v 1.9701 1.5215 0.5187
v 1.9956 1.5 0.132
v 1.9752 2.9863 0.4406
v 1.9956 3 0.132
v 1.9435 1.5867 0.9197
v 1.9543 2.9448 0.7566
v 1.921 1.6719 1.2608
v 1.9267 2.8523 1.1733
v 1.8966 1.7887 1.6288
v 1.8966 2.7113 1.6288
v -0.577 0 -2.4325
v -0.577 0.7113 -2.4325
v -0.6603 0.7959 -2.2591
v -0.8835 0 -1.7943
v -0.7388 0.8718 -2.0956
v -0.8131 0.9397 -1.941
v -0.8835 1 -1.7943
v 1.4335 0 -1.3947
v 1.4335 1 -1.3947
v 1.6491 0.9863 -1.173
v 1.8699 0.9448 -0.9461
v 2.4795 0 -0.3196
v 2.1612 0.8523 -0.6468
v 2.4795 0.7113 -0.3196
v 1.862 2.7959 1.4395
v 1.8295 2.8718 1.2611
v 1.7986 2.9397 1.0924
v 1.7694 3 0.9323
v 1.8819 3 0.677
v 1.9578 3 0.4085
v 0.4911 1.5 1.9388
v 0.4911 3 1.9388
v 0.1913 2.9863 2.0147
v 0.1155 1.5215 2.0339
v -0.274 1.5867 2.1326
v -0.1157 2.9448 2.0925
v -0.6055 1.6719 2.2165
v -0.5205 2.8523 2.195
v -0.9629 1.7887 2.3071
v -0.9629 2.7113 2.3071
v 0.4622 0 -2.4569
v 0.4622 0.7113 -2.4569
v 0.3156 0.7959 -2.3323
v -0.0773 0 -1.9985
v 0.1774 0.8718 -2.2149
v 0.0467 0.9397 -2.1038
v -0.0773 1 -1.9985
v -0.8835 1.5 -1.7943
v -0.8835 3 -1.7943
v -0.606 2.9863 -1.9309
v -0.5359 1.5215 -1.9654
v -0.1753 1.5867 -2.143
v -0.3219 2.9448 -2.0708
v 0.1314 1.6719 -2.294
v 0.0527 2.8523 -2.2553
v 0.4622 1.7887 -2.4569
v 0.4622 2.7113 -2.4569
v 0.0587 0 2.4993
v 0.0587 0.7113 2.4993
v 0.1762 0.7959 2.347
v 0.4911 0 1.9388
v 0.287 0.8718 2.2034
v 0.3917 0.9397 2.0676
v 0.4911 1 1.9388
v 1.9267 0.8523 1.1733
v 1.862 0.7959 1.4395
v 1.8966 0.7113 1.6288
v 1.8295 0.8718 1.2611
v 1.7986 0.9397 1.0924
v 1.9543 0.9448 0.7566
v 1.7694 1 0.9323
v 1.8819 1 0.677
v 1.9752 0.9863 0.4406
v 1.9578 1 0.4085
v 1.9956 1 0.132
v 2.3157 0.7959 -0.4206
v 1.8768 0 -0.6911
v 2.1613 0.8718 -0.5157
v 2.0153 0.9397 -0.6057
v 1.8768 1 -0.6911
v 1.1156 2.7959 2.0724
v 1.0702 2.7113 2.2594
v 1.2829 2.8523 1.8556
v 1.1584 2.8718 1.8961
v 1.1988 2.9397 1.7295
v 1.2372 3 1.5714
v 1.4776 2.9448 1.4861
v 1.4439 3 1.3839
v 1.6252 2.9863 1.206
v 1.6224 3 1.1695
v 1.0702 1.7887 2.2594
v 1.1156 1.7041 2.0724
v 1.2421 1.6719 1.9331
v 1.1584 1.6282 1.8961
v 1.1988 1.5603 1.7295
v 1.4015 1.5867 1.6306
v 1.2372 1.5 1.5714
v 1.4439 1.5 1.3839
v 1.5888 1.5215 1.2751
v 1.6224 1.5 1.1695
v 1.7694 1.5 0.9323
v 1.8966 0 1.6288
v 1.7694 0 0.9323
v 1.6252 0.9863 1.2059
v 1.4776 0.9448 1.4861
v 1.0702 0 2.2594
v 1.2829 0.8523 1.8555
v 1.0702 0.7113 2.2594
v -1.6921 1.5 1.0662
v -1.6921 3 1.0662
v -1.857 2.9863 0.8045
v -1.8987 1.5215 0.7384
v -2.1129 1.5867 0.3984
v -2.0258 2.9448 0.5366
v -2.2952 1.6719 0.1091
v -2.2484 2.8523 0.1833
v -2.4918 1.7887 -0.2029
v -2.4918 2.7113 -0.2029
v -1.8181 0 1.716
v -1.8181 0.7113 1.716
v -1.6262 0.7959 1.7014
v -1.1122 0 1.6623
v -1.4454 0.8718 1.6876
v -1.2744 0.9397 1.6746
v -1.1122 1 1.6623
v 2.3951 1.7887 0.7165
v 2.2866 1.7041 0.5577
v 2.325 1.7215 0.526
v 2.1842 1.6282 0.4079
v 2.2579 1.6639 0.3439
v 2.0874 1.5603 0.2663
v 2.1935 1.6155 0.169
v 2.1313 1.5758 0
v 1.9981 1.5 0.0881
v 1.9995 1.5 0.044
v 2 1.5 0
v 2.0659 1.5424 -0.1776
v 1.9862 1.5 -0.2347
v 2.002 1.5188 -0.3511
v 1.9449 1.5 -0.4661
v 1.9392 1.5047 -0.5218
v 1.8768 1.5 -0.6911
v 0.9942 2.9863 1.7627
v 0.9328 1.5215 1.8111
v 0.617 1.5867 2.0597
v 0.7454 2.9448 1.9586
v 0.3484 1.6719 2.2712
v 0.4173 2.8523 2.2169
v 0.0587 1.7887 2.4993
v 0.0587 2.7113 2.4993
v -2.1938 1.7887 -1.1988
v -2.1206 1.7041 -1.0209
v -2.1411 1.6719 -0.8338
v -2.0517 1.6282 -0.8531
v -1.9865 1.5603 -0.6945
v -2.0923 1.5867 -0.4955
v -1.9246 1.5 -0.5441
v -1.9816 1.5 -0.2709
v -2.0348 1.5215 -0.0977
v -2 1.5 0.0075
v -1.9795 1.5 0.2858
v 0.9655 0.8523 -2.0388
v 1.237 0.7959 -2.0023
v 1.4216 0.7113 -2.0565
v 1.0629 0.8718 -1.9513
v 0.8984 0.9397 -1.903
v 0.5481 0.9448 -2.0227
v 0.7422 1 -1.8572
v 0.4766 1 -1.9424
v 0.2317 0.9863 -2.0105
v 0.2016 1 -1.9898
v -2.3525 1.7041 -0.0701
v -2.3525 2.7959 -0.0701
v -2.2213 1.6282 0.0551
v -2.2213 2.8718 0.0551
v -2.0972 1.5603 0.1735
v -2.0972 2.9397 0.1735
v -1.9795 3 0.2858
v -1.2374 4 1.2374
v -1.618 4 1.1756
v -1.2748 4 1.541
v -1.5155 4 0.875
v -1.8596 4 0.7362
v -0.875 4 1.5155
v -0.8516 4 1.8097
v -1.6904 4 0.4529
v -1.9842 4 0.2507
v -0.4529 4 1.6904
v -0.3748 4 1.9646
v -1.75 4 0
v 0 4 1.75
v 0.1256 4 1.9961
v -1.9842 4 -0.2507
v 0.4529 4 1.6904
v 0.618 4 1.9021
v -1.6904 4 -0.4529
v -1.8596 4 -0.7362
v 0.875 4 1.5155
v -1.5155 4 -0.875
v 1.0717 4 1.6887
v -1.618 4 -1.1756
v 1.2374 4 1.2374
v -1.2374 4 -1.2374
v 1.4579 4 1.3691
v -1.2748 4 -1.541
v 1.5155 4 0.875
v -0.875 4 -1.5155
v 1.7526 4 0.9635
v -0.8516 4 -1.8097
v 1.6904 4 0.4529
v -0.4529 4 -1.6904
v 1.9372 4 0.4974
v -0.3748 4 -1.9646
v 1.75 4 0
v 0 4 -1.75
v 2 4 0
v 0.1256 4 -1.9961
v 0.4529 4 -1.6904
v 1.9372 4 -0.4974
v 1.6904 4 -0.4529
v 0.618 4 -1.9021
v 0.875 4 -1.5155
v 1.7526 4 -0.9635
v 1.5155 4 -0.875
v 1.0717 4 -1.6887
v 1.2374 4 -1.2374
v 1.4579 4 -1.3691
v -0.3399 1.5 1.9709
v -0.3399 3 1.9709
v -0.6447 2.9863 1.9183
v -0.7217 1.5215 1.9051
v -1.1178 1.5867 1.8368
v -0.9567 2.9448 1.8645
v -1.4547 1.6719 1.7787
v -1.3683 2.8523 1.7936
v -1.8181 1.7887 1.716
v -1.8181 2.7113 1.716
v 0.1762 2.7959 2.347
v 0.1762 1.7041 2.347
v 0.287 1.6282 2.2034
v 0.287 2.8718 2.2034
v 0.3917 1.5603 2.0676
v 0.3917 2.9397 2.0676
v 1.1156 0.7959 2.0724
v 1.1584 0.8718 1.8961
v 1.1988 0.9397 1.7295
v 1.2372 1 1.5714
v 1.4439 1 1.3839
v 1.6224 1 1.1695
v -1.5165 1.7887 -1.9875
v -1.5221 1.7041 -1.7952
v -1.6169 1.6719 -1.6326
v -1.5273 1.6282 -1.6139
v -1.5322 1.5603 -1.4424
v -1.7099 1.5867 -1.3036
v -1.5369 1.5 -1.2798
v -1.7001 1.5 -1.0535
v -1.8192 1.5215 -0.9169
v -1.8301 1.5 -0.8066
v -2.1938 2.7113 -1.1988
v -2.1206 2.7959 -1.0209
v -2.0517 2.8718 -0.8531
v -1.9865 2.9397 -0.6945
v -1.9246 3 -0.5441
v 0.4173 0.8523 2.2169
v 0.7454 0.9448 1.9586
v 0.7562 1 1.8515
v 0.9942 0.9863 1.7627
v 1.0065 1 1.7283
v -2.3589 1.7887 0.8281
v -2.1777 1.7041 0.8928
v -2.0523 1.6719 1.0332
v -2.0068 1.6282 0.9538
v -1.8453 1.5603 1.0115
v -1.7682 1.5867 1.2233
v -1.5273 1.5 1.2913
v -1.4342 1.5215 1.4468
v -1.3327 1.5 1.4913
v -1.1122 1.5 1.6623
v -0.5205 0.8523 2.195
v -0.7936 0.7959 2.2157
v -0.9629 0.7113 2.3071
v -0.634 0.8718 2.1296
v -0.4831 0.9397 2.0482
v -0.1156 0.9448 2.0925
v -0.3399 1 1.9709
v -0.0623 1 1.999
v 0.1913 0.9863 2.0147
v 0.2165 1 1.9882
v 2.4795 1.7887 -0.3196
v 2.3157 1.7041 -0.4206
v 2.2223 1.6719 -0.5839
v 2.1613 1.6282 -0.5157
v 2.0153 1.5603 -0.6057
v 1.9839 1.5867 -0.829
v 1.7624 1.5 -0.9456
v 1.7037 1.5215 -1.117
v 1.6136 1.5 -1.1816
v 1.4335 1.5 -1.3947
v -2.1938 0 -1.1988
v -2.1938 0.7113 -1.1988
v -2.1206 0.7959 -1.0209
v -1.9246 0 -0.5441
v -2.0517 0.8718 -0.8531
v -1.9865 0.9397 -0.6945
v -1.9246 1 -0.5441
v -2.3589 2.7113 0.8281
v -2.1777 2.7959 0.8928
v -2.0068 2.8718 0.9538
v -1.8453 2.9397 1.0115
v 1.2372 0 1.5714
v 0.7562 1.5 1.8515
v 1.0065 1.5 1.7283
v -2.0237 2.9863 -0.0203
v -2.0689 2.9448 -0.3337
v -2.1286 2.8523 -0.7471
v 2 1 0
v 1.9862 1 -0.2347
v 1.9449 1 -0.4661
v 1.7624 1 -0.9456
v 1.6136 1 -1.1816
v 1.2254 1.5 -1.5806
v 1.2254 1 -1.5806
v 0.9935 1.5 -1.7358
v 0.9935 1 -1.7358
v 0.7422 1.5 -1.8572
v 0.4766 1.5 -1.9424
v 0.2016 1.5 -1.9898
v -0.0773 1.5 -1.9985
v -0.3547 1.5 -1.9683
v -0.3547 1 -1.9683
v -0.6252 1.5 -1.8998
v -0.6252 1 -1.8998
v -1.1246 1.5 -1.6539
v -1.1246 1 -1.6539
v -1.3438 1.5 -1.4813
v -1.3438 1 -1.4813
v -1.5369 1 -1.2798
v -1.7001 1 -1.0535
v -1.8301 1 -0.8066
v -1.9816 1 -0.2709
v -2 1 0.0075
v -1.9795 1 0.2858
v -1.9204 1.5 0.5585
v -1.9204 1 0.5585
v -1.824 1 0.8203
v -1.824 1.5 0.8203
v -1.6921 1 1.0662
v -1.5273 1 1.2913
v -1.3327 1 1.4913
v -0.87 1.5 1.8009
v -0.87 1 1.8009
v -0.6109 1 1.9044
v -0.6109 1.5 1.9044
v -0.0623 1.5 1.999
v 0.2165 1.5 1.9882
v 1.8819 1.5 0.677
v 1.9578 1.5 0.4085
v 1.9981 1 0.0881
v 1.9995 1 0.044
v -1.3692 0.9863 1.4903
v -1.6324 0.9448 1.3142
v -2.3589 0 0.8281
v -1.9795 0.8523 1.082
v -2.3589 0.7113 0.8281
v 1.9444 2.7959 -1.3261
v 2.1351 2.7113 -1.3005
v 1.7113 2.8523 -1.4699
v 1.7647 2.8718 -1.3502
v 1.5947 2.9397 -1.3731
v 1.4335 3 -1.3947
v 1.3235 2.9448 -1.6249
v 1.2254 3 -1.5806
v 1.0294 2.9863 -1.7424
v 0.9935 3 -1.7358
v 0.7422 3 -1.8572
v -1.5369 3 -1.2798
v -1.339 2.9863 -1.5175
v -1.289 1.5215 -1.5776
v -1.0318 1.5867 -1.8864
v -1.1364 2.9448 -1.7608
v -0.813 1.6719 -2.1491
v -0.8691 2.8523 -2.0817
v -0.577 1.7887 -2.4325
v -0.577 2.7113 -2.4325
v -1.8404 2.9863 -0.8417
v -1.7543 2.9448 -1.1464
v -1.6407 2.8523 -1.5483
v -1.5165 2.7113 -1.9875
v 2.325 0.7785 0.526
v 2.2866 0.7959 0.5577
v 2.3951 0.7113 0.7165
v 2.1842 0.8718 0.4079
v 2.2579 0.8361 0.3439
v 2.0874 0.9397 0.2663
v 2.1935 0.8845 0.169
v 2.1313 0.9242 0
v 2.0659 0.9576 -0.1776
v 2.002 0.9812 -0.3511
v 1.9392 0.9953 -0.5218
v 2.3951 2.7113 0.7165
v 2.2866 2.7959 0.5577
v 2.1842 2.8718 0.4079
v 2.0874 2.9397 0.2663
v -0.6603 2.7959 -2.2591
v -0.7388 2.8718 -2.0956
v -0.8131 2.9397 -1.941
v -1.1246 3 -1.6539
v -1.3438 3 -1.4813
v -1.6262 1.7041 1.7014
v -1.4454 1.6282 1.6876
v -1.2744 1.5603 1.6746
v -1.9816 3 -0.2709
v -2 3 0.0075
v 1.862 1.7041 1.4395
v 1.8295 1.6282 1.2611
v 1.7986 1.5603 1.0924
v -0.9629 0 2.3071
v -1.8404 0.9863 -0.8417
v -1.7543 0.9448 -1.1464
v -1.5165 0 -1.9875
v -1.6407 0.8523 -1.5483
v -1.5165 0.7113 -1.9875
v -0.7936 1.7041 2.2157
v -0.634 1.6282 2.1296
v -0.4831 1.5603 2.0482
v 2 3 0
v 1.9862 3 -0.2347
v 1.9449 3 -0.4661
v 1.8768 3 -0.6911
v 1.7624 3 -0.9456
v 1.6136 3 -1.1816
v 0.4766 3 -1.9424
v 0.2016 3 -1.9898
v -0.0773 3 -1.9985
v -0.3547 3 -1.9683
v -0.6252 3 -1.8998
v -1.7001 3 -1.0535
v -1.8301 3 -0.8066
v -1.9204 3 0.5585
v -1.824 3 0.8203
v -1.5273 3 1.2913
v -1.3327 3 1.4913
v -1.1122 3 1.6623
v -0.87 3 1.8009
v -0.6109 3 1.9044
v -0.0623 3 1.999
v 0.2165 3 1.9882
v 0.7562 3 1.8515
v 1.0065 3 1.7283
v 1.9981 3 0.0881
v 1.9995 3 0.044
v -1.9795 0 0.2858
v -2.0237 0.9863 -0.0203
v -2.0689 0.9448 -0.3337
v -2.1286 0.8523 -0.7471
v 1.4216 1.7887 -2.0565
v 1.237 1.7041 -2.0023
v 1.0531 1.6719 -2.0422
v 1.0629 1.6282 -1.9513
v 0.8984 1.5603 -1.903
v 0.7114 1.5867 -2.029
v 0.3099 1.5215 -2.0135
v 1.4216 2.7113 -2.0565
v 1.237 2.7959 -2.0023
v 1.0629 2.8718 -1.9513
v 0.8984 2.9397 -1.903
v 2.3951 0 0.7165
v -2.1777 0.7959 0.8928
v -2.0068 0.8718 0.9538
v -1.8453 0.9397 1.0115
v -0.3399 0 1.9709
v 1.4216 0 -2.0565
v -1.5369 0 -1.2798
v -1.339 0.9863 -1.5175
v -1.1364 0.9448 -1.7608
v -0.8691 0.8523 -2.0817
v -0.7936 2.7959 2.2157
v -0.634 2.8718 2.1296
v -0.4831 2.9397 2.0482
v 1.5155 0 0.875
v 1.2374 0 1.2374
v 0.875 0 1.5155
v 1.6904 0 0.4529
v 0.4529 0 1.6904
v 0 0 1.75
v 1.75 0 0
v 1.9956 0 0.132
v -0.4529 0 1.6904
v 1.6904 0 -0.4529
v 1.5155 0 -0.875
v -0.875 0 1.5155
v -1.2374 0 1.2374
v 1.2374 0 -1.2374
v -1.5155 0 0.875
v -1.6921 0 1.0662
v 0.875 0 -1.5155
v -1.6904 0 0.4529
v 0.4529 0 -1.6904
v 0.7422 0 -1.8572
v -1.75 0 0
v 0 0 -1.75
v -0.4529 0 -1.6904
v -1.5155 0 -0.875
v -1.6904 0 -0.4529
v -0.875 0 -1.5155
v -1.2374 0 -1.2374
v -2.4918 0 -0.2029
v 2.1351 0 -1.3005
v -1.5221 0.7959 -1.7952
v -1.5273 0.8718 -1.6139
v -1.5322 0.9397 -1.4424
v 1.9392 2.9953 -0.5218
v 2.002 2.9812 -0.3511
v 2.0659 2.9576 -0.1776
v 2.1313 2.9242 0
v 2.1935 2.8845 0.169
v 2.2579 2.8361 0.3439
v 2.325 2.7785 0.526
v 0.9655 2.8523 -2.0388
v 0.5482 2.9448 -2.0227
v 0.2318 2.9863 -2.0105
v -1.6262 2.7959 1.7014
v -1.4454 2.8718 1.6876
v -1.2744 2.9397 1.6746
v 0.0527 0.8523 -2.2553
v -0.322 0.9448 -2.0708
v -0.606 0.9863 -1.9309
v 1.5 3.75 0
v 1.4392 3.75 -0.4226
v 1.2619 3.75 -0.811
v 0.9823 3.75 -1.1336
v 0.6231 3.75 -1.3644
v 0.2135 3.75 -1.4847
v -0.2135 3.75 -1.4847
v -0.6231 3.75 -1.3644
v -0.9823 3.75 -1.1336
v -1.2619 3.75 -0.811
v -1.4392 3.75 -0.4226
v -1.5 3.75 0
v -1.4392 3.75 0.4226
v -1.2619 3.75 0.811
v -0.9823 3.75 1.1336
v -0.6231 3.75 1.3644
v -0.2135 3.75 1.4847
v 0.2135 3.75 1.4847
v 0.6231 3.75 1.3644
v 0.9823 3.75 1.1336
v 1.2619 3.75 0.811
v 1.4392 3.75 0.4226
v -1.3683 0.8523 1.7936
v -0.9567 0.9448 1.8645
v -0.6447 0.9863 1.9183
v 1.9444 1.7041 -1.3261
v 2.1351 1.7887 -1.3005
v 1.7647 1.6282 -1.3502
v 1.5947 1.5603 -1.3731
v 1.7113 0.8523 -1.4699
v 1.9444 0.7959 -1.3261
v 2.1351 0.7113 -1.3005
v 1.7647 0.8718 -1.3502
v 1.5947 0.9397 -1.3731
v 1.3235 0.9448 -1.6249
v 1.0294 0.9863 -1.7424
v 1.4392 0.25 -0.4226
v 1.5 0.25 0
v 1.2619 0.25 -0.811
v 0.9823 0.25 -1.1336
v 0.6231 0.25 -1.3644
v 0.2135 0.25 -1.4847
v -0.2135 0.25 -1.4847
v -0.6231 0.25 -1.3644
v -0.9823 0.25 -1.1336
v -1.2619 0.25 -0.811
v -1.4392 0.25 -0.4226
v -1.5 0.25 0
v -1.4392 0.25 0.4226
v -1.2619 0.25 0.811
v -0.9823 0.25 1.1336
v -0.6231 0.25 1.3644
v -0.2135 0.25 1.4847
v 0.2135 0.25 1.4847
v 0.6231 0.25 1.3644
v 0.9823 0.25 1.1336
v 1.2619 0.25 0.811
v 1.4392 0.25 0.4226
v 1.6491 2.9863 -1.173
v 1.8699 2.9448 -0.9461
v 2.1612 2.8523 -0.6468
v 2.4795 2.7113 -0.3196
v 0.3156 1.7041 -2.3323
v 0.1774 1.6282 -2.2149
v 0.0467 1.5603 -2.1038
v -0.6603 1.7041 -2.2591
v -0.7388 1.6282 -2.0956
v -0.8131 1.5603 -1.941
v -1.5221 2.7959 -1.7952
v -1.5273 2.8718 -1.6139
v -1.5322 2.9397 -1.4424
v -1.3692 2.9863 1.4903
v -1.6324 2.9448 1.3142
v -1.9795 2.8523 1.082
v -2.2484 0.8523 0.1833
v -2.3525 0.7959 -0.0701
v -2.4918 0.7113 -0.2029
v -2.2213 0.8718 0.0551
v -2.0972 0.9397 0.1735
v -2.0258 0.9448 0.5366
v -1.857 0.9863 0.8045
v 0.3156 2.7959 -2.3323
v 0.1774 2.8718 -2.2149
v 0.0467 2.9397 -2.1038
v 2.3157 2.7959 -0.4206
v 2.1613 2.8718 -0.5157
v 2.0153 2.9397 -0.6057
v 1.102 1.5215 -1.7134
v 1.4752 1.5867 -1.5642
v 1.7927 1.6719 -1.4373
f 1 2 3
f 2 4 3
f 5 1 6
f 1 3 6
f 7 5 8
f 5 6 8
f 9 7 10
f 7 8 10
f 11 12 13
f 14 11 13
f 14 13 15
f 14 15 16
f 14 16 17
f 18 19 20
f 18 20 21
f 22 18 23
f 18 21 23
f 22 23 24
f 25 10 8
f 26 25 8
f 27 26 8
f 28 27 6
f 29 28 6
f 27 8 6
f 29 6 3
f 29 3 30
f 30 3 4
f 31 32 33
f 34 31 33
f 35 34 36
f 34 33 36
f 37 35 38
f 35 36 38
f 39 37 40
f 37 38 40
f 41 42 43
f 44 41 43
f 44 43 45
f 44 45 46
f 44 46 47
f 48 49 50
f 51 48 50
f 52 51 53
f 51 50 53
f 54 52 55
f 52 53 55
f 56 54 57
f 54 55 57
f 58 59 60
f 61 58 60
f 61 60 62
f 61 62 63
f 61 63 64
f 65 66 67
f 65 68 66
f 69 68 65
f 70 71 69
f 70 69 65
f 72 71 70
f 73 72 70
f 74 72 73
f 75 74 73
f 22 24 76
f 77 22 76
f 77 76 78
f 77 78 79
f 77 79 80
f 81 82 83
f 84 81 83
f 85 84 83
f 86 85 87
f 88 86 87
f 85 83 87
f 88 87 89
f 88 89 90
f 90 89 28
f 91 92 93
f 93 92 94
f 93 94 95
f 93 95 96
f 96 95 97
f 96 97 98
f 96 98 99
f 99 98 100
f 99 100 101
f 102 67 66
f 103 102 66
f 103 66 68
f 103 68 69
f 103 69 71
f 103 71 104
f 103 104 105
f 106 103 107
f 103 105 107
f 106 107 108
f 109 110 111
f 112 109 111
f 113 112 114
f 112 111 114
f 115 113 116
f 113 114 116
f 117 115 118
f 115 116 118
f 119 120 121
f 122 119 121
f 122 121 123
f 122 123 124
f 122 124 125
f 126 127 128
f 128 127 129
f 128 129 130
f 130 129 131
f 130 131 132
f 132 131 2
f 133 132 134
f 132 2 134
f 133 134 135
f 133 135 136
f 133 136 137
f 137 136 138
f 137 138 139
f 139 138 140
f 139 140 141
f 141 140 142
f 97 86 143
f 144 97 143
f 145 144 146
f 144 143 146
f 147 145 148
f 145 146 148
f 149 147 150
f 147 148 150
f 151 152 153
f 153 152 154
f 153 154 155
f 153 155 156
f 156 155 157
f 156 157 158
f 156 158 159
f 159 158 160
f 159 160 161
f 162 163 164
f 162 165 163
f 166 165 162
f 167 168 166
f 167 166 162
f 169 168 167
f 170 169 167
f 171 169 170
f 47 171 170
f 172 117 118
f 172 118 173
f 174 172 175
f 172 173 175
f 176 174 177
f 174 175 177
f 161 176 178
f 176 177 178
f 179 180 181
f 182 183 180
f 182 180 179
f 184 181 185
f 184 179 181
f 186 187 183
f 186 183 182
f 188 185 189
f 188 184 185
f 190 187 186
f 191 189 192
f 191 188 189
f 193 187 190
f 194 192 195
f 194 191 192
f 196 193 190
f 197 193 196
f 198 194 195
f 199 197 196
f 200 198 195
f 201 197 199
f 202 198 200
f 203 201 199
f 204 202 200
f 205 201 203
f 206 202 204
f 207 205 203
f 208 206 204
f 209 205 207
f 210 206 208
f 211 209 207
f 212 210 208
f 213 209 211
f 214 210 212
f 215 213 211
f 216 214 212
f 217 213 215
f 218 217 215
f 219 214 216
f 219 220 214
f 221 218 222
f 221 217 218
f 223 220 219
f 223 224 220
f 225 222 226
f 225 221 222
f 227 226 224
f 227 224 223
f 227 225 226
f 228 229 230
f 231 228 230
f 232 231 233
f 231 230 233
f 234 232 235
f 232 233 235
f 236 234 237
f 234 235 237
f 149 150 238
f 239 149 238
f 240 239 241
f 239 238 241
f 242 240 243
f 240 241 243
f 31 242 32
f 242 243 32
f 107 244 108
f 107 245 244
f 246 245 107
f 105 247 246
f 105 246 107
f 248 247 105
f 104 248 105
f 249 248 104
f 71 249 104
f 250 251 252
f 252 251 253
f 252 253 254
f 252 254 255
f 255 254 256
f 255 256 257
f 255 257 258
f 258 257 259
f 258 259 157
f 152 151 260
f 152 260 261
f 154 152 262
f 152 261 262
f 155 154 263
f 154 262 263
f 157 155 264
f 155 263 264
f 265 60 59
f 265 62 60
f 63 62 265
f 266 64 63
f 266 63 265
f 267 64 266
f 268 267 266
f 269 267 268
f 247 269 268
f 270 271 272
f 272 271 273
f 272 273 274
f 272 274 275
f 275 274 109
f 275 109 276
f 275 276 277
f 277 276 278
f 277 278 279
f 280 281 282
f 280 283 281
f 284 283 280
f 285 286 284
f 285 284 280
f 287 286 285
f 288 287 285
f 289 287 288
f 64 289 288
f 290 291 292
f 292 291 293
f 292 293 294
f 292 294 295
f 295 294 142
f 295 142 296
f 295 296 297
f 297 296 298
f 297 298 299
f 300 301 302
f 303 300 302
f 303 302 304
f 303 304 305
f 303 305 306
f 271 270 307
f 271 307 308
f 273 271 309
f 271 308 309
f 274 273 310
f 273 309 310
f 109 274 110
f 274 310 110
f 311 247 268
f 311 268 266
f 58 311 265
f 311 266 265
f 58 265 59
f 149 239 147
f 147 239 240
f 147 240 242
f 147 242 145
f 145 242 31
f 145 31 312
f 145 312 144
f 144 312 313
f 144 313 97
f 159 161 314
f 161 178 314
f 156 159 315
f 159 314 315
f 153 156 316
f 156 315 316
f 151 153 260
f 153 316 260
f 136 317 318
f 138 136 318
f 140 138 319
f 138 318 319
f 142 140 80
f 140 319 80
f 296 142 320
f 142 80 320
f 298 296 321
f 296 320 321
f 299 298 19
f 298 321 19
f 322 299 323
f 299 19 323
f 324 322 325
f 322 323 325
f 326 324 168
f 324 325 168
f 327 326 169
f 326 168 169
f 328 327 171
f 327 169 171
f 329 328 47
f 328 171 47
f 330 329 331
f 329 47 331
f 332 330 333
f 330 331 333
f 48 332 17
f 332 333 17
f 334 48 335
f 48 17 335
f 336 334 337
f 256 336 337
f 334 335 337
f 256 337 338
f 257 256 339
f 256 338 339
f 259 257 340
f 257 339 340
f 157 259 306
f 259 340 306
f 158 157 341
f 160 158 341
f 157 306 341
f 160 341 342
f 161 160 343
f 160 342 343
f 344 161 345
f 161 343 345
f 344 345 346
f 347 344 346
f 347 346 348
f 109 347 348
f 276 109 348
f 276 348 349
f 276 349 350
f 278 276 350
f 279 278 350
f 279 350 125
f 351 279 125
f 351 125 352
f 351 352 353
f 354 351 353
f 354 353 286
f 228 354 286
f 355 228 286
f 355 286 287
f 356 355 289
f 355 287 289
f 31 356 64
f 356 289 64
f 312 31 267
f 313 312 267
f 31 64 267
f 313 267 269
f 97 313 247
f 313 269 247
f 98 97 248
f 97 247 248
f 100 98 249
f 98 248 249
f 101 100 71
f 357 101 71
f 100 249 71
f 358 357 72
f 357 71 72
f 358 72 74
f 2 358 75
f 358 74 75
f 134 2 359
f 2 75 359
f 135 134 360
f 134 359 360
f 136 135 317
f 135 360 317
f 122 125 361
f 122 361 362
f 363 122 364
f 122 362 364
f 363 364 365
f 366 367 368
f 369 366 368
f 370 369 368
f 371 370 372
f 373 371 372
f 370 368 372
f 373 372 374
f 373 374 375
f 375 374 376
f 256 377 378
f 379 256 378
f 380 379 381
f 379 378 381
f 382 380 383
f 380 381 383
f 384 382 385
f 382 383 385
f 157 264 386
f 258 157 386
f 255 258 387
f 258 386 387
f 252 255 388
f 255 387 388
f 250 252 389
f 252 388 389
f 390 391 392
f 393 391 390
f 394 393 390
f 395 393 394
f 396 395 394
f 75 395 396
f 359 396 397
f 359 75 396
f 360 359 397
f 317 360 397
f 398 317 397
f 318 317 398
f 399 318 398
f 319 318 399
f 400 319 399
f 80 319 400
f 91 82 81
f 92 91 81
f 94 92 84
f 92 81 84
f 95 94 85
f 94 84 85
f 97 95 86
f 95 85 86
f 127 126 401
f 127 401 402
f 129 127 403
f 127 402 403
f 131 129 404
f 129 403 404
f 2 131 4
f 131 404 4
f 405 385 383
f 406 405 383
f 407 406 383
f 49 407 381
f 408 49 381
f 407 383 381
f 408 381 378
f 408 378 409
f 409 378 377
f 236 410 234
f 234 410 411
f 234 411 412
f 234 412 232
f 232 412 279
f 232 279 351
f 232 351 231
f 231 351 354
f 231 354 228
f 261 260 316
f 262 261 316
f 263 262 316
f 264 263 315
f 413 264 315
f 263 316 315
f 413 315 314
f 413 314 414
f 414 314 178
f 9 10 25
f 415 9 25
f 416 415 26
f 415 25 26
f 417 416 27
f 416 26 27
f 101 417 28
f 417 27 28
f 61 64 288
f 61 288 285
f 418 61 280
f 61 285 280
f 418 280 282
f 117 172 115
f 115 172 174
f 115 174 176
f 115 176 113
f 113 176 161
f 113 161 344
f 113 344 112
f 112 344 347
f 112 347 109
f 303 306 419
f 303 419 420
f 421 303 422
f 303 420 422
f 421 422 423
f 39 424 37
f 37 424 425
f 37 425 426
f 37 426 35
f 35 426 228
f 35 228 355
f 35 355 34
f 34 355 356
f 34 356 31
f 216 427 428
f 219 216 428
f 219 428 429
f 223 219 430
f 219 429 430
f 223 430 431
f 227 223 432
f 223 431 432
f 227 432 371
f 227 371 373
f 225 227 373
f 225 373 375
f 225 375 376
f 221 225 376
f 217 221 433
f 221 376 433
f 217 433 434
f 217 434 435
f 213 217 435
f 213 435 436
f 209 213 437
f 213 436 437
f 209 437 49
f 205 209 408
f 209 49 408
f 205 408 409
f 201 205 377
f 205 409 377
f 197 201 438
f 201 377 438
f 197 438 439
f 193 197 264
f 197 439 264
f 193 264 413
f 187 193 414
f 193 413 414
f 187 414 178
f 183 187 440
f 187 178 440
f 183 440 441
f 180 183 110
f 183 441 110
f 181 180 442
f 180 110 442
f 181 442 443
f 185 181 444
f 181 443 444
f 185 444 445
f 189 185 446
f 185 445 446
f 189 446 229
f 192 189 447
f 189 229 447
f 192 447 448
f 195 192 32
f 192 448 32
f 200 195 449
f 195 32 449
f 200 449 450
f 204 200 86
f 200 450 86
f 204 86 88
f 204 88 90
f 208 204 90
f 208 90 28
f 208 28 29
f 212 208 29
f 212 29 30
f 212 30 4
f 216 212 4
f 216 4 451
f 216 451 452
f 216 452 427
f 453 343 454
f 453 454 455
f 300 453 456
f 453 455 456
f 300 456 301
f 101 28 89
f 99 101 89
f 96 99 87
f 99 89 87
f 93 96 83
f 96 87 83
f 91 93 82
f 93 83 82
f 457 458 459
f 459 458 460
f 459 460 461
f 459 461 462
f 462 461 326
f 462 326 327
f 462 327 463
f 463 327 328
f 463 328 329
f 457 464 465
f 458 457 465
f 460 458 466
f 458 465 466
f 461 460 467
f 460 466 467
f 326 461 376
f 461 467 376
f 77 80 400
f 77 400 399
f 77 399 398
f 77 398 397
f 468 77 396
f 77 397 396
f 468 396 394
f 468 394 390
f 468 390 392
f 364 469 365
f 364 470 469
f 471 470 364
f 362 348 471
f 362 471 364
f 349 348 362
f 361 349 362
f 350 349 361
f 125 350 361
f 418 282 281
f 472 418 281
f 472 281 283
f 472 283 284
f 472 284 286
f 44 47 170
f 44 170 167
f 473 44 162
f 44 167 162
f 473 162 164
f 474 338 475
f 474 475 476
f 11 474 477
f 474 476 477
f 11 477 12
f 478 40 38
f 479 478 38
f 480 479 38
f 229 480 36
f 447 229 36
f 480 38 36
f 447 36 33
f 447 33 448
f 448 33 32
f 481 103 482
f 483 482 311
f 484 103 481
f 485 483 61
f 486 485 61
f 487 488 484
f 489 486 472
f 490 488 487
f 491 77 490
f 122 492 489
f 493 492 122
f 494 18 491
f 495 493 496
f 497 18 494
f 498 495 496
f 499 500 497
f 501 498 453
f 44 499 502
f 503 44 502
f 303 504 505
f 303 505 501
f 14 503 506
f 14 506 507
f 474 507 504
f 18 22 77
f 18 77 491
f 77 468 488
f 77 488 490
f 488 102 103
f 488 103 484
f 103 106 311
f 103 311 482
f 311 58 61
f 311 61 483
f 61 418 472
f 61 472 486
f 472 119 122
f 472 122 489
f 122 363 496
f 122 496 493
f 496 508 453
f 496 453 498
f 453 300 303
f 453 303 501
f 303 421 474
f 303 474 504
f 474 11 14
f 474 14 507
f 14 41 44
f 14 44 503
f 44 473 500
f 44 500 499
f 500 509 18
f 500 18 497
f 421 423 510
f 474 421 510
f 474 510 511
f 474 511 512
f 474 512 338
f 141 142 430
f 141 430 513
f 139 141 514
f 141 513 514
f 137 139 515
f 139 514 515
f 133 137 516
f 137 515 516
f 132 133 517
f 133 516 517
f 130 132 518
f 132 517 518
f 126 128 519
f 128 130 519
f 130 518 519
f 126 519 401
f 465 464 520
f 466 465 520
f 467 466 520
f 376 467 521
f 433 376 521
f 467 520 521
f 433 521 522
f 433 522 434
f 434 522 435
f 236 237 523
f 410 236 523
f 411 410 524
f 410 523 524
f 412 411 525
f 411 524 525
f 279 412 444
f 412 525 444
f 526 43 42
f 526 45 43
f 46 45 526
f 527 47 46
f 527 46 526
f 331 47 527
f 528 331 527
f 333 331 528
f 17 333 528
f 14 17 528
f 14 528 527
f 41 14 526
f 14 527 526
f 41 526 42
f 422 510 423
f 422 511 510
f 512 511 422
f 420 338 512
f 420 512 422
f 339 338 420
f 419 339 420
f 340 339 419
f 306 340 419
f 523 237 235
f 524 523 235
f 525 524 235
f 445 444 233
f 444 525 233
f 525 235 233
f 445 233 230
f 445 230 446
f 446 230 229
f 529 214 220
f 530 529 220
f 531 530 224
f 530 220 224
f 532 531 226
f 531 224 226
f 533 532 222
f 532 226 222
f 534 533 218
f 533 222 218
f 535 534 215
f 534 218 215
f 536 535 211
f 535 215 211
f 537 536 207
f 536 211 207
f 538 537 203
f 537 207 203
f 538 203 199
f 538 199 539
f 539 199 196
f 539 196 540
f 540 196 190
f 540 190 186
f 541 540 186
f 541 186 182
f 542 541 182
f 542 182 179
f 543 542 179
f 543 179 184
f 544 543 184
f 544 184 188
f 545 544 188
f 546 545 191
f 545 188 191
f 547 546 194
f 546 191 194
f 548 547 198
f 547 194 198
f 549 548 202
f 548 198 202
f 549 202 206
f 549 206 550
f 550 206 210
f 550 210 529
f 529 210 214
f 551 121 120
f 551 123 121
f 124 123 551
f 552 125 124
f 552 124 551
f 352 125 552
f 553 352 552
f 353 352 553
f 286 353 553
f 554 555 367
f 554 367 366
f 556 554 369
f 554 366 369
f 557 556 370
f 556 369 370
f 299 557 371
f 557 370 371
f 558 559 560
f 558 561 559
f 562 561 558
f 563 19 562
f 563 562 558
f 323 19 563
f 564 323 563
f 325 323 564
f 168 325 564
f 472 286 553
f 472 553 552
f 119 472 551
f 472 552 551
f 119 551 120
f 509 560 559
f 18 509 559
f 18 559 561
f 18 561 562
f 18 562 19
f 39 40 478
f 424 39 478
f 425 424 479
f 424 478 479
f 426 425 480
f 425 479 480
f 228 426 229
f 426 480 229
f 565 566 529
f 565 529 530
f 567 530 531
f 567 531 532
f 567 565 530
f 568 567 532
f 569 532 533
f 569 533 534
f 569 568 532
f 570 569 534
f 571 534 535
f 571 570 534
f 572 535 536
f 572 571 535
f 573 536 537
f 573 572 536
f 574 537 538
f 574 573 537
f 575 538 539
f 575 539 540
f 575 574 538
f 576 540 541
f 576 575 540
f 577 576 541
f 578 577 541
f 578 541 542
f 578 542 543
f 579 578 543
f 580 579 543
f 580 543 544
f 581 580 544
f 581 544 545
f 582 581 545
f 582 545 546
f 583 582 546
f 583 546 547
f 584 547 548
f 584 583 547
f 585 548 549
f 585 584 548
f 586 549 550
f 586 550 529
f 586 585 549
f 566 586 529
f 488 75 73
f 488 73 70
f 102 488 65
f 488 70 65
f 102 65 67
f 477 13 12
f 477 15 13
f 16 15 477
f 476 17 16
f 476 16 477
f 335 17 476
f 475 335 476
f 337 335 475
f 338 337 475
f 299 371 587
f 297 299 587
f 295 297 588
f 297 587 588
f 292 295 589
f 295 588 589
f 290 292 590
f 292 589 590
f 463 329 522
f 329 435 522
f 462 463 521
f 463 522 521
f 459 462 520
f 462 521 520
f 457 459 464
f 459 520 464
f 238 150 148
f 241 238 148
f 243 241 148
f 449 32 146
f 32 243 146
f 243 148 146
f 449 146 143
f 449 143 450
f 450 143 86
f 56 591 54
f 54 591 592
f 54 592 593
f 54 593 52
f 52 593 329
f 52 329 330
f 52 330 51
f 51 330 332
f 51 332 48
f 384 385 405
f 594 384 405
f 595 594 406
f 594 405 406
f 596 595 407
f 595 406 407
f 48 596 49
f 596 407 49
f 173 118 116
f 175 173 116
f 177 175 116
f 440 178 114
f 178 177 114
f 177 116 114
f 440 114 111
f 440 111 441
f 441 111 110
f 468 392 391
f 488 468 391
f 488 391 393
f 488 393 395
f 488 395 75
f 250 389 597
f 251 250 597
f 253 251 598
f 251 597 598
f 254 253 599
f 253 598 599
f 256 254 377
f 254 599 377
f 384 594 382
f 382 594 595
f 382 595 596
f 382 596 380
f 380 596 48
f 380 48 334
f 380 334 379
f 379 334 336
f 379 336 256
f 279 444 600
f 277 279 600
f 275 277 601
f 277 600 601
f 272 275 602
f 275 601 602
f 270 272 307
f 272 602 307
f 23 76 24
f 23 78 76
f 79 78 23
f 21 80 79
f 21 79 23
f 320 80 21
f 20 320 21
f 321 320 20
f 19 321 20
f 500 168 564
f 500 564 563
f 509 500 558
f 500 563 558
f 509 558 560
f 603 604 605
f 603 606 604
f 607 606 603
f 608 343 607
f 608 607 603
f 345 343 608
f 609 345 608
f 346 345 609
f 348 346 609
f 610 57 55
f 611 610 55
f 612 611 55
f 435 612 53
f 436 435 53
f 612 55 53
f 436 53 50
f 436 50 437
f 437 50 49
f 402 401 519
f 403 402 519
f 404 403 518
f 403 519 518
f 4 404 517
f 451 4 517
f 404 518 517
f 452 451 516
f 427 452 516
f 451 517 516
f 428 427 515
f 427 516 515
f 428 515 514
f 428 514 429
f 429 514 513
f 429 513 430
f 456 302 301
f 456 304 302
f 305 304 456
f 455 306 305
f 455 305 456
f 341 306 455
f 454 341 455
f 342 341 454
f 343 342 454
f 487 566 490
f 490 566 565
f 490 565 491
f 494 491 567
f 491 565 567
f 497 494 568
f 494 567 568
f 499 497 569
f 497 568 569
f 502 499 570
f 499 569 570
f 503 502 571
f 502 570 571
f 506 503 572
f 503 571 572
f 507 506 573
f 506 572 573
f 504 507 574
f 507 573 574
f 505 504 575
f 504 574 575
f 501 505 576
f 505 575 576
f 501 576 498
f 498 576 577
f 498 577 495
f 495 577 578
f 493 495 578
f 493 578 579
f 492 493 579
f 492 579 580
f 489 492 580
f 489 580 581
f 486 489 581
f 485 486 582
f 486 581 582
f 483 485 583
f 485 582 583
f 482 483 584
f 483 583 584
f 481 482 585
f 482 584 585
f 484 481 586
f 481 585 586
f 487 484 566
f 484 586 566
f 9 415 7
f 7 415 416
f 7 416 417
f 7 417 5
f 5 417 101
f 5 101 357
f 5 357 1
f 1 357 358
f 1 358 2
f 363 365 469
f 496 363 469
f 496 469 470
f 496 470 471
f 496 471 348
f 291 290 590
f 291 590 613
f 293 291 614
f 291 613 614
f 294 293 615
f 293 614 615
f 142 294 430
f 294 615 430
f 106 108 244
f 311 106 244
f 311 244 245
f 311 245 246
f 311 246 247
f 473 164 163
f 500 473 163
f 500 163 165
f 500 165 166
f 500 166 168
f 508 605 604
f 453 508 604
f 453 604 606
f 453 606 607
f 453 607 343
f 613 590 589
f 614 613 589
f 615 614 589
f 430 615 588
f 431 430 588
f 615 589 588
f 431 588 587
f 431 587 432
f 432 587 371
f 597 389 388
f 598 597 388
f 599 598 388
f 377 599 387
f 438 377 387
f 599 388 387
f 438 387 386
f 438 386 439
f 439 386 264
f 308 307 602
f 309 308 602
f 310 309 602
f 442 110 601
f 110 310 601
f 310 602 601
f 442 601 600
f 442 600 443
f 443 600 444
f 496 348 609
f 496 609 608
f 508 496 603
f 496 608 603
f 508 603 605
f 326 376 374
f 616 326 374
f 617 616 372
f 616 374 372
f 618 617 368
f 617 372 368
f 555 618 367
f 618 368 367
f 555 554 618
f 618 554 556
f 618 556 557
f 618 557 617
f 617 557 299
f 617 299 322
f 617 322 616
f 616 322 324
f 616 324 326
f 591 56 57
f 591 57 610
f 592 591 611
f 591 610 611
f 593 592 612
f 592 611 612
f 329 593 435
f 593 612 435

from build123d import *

# Parameters (mm, degrees)
SKETCH1_R           = 2
SKETCH1_R_2         = 1.5
BOSS_EXTRUDE1_DEPTH = 4
CUT_EXTRUDE3_DEPTH  = 5
CHAMFER1_SIZE       = 0.25


with BuildPart() as part:
    # Sketch1 → Boss-Extrude1 (new body)
    with BuildSketch(Plane(origin=(0, 0, 0), x_dir=(1, 0, 0), z_dir=(0, 1, 0))):
        Circle(SKETCH1_R)
        Circle(SKETCH1_R_2, mode=Mode.SUBTRACT)
    extrude(amount=BOSS_EXTRUDE1_DEPTH)

    # Sketch2 → Revolve1 (revolve)
    with BuildSketch(Plane.XY):
        Polygon((2, 3), (2.5, 2.711324865), (2.5, 1.788675135), (2, 1.5), align=None)
        Polygon((2, 0), (2.5, 0), (2.5, 0.711324865), (2, 1), align=None)
    revolve(axis=Axis((0, 0, 0), (0, 1, 0)))

    # Sketch3 → Cut-Extrude3 (cut, through all)
    with BuildSketch(Plane(origin=(0, 4, 0), x_dir=(1, 0, 0), z_dir=(0, 1, 0))):
        with BuildLine():
            Line((-0.883481791, 1.794285352), (0.462232224, 2.456896695))
            ThreePointArc((0.462232224, 2.456896695), (-0.058686206, 2.499311091), (-0.577039766, 2.432493599))
            Line((-0.577039766, 2.432493599), (-0.883481791, 1.794285352))
        make_face()
        with BuildLine():
            Line((0.462232224, 2.456896695), (-0.077299176, 1.998505651))
            Line((-0.077299176, 1.998505651), (1.421580063, 2.056480033))
            ThreePointArc((1.421580063, 2.056480033), (0.962948887, 2.307104125), (0.462232224, 2.456896695))
        make_face()
        with BuildLine():
            ThreePointArc((2.135123794, 1.30047929), (1.818081368, 1.715977896), (1.421580063, 2.056480033))
            Line((1.421580063, 2.056480033), (0.742249169, 1.857166167))
            Line((0.742249169, 1.857166167), (2.135123794, 1.30047929))
        make_face()
        with BuildLine():
            ThreePointArc((2.479485224, 0.319613864), (2.358851064, 0.8281435), (2.135123794, 1.30047929))
            Line((2.135123794, 1.30047929), (1.433455889, 1.394705781))
            Line((1.433455889, 1.394705781), (2.479485224, 0.319613864))
        make_face()
        with BuildLine():
            ThreePointArc((2.5, 0), (2.494866035, 0.160135785), (2.479485224, 0.319613864))
            Line((2.479485224, 0.319613864), (1.876805063, 0.691088094))
            Line((1.876805063, 0.691088094), (2.395121134, -0.716515703))
            ThreePointArc((2.395121134, -0.716515703), (2.473641328, -0.362075382), (2.5, 0))
        make_face()
        with BuildLine():
            ThreePointArc((1.896618841, -1.628753196), (2.193809999, -1.198831801), (2.395121134, -0.716515703))
            Line((2.395121134, -0.716515703), (1.995637592, -0.132025002))
            Line((1.995637592, -0.132025002), (1.896618841, -1.628753196))
        make_face()
        with BuildLine():
            ThreePointArc((1.07017392, -2.259364464), (1.516536338, -1.987490261), (1.896618841, -1.628753196))
            Line((1.896618841, -1.628753196), (1.769406251, -0.932309776))
            Line((1.769406251, -0.932309776), (1.07017392, -2.259364464))
        make_face()
        with BuildLine():
            ThreePointArc((0.058686206, -2.499311091), (0.577039766, -2.432493599), (1.07017392, -2.259364464))
            Line((1.07017392, -2.259364464), (1.237228495, -1.57138972))
            Line((1.237228495, -1.57138972), (0.058686206, -2.499311091))
        make_face()
        with BuildLine():
            ThreePointArc((-0.962948887, -2.307104125), (-0.462232224, -2.456896695), (0.058686206, -2.499311091))
            Line((0.058686206, -2.499311091), (0.491122692, -1.938762105))
            Line((0.491122692, -1.938762105), (-0.962948887, -2.307104125))
        make_face()
        with BuildLine():
            Line((-0.339902686, -1.97090491), (-1.818081368, -1.715977896))
            ThreePointArc((-1.818081368, -1.715977896), (-1.421580063, -2.056480033), (-0.962948887, -2.307104125))
            Line((-0.962948887, -2.307104125), (-0.339902686, -1.97090491))
        make_face()
        with BuildLine():
            Line((-1.112155801, -1.662260351), (-2.358851064, -0.8281435))
            ThreePointArc((-2.358851064, -0.8281435), (-2.135123794, -1.30047929), (-1.818081368, -1.715977896))
            Line((-1.818081368, -1.715977896), (-1.112155801, -1.662260351))
        make_face()
        with BuildLine():
            Line((-1.692107076, -1.066195875), (-2.491753982, 0.202884431))
            ThreePointArc((-2.491753982, 0.202884431), (-2.479485224, -0.319613864), (-2.358851064, -0.8281435))
            Line((-2.358851064, -0.8281435), (-1.692107076, -1.066195875))
        make_face()
        with BuildLine():
            Line((-1.979477664, -0.285776447), (-2.193809999, 1.198831801))
            ThreePointArc((-2.193809999, 1.198831801), (-2.395121134, 0.716515703), (-2.491753982, 0.202884431))
            Line((-2.491753982, 0.202884431), (-1.979477664, -0.285776447))
        make_face()
        with BuildLine():
            Line((-1.924578581, 0.544056325), (-1.516536338, 1.987490261))
            ThreePointArc((-1.516536338, 1.987490261), (-1.896618841, 1.628753196), (-2.193809999, 1.198831801))
            Line((-2.193809999, 1.198831801), (-1.924578581, 0.544056325))
        make_face()
        with BuildLine():
            Line((-1.536902378, 1.279816816), (-0.577039766, 2.432493599))
            ThreePointArc((-0.577039766, 2.432493599), (-1.07017392, 2.259364464), (-1.516536338, 1.987490261))
            Line((-1.516536338, 1.987490261), (-1.536902378, 1.279816816))
        make_face()
    extrude(amount=-CUT_EXTRUDE3_DEPTH, mode=Mode.SUBTRACT)

    # Chamfer1
    chamfer1_edges = [part.edges().sort_by_distance(p)[0] for p in [
        (-1.5, 0, 0),
        (-1.5, 4, 0),
    ]]
    chamfer(chamfer1_edges, length=CHAMFER1_SIZE)


solid = part.part
